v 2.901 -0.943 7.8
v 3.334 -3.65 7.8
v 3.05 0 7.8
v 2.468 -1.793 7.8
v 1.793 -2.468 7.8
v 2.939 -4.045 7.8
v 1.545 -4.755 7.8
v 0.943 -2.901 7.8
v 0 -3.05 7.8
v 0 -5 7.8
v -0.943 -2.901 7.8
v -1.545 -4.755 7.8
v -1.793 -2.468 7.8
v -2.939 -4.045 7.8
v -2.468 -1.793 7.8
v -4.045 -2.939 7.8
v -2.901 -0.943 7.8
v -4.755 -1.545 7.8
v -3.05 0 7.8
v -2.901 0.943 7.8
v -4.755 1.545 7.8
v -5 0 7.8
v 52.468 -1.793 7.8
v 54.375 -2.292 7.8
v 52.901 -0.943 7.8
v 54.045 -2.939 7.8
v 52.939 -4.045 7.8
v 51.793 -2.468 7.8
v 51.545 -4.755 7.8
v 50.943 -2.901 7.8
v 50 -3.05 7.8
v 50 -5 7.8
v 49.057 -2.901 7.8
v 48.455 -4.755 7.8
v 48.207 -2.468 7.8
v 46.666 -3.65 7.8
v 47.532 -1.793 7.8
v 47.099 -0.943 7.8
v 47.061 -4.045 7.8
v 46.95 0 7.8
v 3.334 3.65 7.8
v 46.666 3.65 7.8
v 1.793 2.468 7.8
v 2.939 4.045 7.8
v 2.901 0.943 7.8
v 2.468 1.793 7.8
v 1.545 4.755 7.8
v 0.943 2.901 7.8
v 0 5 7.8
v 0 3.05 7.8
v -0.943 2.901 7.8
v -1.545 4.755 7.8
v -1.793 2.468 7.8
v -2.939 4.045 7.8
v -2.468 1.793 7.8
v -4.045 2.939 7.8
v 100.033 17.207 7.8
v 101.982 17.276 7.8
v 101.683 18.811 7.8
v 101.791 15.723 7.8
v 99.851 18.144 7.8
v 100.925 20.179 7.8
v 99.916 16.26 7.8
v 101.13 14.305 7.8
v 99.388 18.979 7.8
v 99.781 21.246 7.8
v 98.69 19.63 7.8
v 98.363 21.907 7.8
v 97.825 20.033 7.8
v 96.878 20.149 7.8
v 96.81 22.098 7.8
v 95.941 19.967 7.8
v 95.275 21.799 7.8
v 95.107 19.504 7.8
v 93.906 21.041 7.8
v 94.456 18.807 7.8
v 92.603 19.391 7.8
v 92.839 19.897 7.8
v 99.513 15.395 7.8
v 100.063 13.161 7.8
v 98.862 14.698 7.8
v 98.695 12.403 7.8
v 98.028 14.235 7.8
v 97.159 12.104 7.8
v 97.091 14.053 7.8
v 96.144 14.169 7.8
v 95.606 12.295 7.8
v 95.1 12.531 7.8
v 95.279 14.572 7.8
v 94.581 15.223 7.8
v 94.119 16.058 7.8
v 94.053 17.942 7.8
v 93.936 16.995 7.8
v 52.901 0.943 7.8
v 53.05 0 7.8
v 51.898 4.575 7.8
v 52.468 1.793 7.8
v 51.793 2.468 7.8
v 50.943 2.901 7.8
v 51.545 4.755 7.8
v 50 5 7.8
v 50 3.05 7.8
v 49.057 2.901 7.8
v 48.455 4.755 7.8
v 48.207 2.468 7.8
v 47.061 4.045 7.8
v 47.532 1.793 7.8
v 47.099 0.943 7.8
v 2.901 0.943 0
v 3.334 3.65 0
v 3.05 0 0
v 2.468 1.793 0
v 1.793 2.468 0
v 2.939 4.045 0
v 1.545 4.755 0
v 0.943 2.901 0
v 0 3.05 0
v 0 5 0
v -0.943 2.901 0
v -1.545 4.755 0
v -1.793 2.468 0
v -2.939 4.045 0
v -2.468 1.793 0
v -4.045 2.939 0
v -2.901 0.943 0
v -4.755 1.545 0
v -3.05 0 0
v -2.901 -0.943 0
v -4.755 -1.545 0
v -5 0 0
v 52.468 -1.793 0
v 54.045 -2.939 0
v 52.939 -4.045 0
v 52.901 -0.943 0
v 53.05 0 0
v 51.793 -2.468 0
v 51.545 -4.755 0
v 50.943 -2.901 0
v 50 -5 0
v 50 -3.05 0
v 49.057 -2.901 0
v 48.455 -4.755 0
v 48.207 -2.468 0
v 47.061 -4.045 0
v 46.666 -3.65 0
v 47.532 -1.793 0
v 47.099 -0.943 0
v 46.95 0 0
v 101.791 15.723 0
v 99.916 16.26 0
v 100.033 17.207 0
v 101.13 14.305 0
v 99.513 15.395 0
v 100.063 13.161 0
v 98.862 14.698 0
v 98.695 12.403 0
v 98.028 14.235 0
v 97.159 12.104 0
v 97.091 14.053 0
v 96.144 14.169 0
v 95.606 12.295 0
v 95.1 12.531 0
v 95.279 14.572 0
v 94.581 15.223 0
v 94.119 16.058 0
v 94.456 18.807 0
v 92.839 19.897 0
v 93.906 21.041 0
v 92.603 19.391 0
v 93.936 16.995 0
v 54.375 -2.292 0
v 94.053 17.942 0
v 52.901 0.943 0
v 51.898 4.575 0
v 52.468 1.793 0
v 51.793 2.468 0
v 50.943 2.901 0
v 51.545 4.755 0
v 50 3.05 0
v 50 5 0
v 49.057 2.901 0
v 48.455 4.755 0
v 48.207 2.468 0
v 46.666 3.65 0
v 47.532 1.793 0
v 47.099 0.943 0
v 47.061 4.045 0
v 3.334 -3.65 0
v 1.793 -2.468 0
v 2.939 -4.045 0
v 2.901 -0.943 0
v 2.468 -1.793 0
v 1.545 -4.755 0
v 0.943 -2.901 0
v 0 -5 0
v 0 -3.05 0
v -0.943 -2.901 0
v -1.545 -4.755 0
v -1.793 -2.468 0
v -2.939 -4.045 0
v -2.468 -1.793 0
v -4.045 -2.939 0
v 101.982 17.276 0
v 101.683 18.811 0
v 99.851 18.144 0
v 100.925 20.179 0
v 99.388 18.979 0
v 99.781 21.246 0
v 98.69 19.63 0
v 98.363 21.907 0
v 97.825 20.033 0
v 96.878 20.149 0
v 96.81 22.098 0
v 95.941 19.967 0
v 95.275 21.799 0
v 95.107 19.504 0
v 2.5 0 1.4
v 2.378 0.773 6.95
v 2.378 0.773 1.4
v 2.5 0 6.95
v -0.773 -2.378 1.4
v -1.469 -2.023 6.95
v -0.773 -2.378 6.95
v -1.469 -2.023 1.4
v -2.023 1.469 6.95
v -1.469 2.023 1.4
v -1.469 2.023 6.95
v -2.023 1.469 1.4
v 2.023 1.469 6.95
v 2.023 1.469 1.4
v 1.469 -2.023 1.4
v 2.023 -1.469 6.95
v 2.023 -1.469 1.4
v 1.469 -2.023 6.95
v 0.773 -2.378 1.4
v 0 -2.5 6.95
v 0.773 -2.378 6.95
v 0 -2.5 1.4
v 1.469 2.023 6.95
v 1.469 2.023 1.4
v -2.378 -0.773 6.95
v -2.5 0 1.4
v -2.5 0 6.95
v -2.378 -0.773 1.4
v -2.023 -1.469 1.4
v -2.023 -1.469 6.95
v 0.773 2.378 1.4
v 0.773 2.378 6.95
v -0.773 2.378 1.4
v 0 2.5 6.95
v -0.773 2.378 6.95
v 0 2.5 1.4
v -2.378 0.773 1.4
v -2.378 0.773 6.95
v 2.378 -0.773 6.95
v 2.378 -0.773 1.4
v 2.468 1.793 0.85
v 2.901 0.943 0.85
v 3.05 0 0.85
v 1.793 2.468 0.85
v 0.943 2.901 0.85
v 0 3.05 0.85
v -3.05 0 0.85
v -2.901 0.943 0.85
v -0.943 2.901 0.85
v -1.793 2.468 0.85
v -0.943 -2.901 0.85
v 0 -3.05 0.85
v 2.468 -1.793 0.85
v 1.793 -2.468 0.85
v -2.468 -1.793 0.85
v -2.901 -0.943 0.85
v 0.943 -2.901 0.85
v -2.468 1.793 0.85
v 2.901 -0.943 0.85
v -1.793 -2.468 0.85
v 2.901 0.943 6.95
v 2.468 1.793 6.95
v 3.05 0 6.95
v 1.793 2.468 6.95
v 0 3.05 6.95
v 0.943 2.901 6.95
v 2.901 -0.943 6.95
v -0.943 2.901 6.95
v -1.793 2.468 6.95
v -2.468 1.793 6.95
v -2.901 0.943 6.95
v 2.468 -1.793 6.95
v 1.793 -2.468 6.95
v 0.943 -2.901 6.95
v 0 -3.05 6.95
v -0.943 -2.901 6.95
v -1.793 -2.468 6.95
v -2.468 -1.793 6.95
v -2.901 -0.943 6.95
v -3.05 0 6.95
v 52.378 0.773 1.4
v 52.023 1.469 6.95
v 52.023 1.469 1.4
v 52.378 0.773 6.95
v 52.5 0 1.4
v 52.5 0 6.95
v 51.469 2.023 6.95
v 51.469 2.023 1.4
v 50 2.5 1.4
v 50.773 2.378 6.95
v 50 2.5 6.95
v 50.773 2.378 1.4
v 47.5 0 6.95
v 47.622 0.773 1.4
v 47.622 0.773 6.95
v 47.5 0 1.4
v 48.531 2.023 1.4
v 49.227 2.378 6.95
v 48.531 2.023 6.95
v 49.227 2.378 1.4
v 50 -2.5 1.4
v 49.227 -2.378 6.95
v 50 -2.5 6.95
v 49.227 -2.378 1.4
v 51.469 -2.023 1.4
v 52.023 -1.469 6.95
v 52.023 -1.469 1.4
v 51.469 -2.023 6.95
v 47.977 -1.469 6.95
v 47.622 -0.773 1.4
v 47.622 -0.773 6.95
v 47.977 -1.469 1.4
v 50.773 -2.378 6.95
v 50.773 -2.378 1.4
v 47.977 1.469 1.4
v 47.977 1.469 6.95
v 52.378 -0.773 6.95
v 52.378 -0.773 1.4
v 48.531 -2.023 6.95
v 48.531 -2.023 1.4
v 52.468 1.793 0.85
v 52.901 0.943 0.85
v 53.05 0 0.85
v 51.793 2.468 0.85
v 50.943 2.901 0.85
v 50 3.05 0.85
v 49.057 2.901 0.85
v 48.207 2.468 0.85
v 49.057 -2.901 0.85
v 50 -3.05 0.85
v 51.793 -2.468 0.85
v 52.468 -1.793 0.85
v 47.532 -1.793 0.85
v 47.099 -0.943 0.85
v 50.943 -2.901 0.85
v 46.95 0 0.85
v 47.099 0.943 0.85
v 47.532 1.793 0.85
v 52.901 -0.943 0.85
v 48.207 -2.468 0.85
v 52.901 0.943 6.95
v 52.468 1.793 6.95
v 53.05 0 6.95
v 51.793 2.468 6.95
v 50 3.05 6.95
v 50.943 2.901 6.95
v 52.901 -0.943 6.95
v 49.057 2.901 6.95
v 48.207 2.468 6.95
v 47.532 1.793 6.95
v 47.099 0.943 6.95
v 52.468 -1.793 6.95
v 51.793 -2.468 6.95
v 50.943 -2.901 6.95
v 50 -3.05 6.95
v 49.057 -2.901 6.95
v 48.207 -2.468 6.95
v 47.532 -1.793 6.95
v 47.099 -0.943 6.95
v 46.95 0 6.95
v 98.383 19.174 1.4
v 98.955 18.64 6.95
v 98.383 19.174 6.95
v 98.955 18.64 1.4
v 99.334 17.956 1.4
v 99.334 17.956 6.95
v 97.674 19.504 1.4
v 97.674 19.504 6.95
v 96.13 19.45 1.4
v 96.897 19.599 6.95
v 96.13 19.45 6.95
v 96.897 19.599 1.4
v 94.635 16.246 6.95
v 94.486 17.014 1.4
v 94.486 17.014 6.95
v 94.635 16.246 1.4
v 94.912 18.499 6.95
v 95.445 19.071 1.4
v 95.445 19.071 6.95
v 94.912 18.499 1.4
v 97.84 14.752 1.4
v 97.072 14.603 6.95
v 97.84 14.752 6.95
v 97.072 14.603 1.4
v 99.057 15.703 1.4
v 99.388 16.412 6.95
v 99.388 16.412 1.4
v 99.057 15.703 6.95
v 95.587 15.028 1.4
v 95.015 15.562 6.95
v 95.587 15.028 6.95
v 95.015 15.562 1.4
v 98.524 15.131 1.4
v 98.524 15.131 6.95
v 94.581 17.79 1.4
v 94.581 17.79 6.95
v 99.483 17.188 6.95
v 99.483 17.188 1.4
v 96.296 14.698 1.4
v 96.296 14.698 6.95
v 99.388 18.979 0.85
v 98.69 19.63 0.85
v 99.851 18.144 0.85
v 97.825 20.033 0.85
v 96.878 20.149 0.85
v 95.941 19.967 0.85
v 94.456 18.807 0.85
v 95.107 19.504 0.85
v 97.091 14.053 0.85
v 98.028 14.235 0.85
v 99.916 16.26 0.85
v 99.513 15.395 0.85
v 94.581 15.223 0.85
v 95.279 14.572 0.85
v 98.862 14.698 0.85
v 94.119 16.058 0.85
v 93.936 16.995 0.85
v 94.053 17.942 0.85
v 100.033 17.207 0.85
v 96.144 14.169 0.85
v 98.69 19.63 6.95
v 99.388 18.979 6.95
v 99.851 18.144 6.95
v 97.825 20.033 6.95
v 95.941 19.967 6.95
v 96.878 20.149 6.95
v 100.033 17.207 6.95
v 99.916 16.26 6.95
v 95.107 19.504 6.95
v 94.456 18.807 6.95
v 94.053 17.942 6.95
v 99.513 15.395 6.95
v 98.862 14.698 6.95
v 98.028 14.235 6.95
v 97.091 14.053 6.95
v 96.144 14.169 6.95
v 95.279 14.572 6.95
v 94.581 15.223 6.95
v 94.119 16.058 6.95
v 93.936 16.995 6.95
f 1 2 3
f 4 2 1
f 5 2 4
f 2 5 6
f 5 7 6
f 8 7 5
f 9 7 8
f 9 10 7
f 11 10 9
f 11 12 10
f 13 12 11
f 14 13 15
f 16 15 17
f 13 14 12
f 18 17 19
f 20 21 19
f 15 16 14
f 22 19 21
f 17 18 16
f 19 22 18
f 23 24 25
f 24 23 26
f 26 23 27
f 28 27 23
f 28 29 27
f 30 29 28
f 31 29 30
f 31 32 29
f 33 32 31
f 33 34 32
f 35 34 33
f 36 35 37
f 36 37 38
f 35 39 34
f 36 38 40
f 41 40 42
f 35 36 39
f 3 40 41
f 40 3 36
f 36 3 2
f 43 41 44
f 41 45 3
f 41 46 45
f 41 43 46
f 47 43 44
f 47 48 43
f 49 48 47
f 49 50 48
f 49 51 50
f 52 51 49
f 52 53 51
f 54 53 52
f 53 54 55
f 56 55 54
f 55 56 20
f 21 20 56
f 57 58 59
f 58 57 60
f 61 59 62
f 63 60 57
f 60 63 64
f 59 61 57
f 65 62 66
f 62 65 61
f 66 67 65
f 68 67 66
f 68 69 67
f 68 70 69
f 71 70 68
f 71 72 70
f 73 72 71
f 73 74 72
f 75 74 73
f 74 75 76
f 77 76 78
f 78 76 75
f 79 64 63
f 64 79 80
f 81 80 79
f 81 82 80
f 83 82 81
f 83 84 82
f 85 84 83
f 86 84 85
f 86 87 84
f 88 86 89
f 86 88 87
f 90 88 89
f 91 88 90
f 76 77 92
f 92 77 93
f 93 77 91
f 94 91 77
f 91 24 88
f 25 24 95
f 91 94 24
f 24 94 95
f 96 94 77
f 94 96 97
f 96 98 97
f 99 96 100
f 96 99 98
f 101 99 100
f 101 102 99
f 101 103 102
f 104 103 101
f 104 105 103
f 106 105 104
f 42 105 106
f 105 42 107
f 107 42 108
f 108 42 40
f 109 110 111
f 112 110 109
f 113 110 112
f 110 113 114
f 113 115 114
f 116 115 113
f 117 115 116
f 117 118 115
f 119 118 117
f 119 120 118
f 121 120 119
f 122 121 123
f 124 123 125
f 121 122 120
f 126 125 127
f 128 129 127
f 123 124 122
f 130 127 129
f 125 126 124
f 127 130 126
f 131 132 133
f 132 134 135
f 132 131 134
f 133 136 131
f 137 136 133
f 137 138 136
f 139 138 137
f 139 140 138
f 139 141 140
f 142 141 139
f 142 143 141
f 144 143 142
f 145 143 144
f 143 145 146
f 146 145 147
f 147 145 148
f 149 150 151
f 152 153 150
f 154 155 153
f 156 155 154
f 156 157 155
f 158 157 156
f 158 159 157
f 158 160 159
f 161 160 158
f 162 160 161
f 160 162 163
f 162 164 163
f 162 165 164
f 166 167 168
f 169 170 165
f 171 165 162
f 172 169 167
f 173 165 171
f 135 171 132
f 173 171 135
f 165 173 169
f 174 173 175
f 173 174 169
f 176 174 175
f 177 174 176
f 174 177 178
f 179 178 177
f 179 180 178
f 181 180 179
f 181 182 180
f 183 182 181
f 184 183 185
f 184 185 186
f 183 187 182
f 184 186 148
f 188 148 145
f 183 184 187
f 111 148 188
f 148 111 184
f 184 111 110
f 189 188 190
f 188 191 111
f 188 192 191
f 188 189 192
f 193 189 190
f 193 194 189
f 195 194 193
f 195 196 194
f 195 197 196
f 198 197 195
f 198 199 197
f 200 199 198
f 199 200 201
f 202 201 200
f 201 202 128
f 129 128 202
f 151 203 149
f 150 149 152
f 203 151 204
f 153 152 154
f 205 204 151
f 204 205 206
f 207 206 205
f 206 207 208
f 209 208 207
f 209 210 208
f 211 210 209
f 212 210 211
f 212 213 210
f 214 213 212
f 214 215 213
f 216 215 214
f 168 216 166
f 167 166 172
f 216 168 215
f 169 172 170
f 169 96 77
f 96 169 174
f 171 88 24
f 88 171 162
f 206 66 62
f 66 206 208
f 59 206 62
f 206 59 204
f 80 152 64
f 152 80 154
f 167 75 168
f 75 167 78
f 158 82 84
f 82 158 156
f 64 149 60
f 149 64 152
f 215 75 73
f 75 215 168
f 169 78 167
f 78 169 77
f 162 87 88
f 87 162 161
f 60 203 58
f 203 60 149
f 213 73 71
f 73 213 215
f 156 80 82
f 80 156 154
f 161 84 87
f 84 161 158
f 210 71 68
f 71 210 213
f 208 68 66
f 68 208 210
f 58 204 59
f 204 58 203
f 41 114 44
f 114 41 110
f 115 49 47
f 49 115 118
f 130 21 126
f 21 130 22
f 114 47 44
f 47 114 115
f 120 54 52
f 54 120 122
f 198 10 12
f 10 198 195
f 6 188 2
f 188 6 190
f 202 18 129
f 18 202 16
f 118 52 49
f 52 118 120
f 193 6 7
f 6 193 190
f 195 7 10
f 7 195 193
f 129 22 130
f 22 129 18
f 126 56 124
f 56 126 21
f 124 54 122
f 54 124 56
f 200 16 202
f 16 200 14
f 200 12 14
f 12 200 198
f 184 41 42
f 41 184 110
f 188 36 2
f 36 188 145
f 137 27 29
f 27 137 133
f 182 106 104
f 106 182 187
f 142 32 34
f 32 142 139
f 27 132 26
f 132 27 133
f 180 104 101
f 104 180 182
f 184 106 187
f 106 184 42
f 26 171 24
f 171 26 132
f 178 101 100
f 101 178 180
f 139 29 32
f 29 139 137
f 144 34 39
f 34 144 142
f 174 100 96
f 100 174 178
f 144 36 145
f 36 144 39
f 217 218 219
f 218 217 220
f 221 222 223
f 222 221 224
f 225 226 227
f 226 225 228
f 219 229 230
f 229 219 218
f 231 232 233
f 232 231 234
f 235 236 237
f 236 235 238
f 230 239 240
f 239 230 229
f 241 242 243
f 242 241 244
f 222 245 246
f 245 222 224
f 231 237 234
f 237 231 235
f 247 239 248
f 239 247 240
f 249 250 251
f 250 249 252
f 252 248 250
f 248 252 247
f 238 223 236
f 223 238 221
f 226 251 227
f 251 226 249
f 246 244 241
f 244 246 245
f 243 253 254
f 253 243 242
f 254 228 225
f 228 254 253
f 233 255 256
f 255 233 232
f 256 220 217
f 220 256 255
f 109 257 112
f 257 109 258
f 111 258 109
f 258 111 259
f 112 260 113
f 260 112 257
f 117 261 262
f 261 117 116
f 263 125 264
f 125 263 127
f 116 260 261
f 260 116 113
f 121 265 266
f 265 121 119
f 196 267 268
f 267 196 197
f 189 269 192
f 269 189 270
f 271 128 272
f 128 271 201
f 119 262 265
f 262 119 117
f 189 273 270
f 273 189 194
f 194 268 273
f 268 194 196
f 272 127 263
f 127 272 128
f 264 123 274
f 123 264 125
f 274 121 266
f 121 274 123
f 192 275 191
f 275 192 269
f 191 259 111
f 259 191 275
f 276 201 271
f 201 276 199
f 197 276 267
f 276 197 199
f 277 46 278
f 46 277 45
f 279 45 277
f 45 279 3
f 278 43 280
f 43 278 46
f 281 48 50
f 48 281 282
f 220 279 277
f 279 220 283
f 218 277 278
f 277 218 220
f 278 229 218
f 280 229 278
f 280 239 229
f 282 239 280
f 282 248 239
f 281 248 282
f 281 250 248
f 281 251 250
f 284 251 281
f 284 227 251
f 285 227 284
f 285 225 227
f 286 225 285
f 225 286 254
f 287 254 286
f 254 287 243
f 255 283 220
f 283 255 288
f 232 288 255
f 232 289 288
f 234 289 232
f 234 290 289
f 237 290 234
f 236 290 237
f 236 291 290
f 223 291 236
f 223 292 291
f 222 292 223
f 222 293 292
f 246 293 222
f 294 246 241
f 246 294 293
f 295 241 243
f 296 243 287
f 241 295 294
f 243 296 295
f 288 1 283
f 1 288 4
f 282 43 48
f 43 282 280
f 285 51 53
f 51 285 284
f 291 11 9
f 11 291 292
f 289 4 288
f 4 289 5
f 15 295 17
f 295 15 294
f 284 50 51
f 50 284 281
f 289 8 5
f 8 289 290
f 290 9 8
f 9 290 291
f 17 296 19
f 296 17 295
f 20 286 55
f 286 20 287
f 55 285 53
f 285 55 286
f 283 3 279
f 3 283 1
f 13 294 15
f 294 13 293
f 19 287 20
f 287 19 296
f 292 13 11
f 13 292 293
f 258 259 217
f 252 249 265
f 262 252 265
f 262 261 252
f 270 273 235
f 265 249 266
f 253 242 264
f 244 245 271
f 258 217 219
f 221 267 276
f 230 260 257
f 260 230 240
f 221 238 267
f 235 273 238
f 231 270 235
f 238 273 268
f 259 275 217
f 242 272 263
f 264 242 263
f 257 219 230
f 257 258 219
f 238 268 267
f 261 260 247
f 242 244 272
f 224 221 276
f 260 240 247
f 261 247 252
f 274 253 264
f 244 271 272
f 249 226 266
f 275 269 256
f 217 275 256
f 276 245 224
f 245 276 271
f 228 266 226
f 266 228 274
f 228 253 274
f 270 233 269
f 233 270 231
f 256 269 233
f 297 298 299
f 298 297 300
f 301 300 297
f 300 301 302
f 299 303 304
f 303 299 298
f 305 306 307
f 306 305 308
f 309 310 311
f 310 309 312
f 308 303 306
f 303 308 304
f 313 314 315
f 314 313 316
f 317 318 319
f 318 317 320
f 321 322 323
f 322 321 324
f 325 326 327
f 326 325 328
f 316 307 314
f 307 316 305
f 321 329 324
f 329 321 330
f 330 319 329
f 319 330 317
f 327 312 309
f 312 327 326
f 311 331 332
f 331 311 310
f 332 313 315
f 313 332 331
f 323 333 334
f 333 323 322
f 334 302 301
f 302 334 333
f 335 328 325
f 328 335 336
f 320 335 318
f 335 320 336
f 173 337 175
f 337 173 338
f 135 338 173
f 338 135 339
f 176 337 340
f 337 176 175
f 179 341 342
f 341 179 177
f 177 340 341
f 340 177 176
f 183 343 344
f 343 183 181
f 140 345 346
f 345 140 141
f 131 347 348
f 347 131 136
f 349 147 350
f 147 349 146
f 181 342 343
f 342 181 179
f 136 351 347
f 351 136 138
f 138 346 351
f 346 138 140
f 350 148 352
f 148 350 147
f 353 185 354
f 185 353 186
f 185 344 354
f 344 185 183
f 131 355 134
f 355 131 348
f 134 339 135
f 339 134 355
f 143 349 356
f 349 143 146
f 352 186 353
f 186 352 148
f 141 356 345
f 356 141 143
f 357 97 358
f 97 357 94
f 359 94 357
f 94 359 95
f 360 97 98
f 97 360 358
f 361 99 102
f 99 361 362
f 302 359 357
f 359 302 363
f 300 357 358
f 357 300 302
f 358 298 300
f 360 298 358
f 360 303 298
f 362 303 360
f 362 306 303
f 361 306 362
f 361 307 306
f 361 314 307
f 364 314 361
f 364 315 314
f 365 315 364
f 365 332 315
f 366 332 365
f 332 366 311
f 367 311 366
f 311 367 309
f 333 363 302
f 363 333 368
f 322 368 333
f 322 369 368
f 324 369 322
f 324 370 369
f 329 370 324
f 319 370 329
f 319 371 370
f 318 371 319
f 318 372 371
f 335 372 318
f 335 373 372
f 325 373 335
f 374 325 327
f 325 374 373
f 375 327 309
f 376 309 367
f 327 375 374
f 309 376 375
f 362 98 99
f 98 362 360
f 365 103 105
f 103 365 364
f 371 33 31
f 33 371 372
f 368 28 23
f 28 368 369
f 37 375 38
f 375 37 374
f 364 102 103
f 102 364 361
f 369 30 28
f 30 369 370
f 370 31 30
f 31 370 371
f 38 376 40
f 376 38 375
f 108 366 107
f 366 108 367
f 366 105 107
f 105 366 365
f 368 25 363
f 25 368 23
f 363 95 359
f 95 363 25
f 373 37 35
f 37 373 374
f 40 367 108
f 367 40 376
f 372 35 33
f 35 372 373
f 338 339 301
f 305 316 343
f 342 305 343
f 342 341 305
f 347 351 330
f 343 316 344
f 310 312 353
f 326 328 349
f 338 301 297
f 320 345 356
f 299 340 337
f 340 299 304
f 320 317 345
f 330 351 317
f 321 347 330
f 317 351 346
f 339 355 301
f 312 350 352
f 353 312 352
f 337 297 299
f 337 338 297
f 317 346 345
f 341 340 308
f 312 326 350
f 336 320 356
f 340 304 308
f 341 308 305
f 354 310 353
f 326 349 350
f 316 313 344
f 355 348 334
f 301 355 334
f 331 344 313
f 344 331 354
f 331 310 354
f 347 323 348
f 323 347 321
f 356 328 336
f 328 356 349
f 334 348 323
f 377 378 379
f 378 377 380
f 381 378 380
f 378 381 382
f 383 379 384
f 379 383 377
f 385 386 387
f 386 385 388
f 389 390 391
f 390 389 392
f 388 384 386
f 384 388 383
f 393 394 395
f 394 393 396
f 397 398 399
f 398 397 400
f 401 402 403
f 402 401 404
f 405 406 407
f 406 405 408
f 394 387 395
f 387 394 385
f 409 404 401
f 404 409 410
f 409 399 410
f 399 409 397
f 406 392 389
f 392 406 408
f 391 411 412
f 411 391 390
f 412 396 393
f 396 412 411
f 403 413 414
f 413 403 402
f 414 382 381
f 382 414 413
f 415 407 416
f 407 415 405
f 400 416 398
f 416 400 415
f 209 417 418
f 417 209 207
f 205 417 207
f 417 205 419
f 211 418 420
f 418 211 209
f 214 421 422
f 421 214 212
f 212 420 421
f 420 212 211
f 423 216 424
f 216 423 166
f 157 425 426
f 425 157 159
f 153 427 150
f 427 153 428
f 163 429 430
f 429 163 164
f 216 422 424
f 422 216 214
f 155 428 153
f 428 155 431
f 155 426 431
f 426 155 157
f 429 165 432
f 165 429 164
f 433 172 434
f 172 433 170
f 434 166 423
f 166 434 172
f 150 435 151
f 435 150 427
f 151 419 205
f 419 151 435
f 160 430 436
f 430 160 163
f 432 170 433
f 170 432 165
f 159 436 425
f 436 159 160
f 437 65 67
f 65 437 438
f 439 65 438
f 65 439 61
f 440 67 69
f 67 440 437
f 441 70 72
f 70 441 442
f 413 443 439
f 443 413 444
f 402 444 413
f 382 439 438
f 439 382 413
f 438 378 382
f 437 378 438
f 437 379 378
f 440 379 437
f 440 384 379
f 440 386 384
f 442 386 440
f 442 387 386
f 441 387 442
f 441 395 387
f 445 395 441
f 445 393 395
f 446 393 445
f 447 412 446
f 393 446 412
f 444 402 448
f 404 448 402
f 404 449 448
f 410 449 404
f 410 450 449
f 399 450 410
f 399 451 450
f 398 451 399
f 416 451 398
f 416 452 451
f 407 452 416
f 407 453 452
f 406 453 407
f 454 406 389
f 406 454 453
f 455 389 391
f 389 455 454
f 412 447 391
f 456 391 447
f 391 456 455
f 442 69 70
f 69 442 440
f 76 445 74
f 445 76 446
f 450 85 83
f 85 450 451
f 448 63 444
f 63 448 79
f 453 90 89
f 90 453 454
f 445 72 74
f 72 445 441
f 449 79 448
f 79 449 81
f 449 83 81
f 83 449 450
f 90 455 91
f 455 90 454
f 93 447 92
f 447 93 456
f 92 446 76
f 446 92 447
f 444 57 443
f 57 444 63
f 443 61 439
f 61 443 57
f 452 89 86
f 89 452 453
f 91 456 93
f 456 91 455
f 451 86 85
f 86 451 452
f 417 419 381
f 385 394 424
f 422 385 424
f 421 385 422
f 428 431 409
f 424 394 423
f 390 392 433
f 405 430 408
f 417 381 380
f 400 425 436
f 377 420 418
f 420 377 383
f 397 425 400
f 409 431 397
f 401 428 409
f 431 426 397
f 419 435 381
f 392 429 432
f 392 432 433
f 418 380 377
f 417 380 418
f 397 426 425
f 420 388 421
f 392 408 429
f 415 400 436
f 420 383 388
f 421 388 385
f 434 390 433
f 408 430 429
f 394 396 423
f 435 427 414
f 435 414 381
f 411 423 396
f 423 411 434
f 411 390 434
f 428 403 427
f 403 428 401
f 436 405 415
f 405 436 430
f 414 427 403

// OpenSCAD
/*      
Customizable freeform-3-hole LEGO Technic Connector Bone
Jens Henrik Sandell
July 2016
Updated December 2016

Created by forking the thing:629875
        Customizable Curved LEGO Technic Beam
        Steve Medwin
        January 2015
*/
$fn=20*1.0;
// preview[view:north east, tilt:top]

// constants
width = 7.3*1.0; // beam width
height = 7.8*1.0; // beam height
hole = 5.0/2; // hole diameter
counter = 6.1/2; // countersink diameter
depth = 0.85*1.0; // countersink depth
pitch = 8.0*1.0; // distance between holes

// user parameters
// distance between first and mid hole =
Distance1 = 50; // [20:100]
// distance between mid and last hole =
Distance2 = 50; // [20:60]
// width of knuckle and ends =
Knuckle = 10; // [8:16]
// angle between first and second bone =
AngleBones = 20.0; // [0.0:90]

// calculations
// create beam
difference()
{
	union(){
		cylinder(h=height, r=Knuckle/2);
		translate([0,-width/2,0]) cube([Distance1,width,height]);
		translate([Distance1,0,0]) cylinder(h=height,r=Knuckle/2);

		translate([Distance1,0,0]) rotate([0,0,AngleBones]) {
			translate([0,-width/2,0]) cube([Distance2,width,height]);
			translate([Distance2,0,0]) cylinder(h=height,r=Knuckle/2);
		}
	}
	for (i=[0:1]) {
		translate([i*Distance1,0,0]) {
			translate([0,0,-2])
			cylinder(h=height+4, r=hole);
                
			translate([0,0,-0.01])
			cylinder(h=depth+0.01, r=counter);      
                
			translate([0,0,height-depth])
			cylinder(h=depth+0.01, r=counter);
                
			translate([0,0,depth])
			cylinder(h=(counter - hole), r1=counter, r2=hole);           
		}    
	}
	translate([Distance1,0,0]) rotate([0,0,AngleBones]) translate([Distance2,0,0]) {
		translate([0,0,-2])
		cylinder(h=height+4, r=hole);
               
		translate([0,0,-0.01])
		cylinder(h=depth+0.01, r=counter);      
                
		translate([0,0,height-depth])
		cylinder(h=depth+0.01, r=counter);
                
		translate([0,0,depth])
		cylinder(h=(counter - hole), r1=counter, r2=hole);           
	}    
}
